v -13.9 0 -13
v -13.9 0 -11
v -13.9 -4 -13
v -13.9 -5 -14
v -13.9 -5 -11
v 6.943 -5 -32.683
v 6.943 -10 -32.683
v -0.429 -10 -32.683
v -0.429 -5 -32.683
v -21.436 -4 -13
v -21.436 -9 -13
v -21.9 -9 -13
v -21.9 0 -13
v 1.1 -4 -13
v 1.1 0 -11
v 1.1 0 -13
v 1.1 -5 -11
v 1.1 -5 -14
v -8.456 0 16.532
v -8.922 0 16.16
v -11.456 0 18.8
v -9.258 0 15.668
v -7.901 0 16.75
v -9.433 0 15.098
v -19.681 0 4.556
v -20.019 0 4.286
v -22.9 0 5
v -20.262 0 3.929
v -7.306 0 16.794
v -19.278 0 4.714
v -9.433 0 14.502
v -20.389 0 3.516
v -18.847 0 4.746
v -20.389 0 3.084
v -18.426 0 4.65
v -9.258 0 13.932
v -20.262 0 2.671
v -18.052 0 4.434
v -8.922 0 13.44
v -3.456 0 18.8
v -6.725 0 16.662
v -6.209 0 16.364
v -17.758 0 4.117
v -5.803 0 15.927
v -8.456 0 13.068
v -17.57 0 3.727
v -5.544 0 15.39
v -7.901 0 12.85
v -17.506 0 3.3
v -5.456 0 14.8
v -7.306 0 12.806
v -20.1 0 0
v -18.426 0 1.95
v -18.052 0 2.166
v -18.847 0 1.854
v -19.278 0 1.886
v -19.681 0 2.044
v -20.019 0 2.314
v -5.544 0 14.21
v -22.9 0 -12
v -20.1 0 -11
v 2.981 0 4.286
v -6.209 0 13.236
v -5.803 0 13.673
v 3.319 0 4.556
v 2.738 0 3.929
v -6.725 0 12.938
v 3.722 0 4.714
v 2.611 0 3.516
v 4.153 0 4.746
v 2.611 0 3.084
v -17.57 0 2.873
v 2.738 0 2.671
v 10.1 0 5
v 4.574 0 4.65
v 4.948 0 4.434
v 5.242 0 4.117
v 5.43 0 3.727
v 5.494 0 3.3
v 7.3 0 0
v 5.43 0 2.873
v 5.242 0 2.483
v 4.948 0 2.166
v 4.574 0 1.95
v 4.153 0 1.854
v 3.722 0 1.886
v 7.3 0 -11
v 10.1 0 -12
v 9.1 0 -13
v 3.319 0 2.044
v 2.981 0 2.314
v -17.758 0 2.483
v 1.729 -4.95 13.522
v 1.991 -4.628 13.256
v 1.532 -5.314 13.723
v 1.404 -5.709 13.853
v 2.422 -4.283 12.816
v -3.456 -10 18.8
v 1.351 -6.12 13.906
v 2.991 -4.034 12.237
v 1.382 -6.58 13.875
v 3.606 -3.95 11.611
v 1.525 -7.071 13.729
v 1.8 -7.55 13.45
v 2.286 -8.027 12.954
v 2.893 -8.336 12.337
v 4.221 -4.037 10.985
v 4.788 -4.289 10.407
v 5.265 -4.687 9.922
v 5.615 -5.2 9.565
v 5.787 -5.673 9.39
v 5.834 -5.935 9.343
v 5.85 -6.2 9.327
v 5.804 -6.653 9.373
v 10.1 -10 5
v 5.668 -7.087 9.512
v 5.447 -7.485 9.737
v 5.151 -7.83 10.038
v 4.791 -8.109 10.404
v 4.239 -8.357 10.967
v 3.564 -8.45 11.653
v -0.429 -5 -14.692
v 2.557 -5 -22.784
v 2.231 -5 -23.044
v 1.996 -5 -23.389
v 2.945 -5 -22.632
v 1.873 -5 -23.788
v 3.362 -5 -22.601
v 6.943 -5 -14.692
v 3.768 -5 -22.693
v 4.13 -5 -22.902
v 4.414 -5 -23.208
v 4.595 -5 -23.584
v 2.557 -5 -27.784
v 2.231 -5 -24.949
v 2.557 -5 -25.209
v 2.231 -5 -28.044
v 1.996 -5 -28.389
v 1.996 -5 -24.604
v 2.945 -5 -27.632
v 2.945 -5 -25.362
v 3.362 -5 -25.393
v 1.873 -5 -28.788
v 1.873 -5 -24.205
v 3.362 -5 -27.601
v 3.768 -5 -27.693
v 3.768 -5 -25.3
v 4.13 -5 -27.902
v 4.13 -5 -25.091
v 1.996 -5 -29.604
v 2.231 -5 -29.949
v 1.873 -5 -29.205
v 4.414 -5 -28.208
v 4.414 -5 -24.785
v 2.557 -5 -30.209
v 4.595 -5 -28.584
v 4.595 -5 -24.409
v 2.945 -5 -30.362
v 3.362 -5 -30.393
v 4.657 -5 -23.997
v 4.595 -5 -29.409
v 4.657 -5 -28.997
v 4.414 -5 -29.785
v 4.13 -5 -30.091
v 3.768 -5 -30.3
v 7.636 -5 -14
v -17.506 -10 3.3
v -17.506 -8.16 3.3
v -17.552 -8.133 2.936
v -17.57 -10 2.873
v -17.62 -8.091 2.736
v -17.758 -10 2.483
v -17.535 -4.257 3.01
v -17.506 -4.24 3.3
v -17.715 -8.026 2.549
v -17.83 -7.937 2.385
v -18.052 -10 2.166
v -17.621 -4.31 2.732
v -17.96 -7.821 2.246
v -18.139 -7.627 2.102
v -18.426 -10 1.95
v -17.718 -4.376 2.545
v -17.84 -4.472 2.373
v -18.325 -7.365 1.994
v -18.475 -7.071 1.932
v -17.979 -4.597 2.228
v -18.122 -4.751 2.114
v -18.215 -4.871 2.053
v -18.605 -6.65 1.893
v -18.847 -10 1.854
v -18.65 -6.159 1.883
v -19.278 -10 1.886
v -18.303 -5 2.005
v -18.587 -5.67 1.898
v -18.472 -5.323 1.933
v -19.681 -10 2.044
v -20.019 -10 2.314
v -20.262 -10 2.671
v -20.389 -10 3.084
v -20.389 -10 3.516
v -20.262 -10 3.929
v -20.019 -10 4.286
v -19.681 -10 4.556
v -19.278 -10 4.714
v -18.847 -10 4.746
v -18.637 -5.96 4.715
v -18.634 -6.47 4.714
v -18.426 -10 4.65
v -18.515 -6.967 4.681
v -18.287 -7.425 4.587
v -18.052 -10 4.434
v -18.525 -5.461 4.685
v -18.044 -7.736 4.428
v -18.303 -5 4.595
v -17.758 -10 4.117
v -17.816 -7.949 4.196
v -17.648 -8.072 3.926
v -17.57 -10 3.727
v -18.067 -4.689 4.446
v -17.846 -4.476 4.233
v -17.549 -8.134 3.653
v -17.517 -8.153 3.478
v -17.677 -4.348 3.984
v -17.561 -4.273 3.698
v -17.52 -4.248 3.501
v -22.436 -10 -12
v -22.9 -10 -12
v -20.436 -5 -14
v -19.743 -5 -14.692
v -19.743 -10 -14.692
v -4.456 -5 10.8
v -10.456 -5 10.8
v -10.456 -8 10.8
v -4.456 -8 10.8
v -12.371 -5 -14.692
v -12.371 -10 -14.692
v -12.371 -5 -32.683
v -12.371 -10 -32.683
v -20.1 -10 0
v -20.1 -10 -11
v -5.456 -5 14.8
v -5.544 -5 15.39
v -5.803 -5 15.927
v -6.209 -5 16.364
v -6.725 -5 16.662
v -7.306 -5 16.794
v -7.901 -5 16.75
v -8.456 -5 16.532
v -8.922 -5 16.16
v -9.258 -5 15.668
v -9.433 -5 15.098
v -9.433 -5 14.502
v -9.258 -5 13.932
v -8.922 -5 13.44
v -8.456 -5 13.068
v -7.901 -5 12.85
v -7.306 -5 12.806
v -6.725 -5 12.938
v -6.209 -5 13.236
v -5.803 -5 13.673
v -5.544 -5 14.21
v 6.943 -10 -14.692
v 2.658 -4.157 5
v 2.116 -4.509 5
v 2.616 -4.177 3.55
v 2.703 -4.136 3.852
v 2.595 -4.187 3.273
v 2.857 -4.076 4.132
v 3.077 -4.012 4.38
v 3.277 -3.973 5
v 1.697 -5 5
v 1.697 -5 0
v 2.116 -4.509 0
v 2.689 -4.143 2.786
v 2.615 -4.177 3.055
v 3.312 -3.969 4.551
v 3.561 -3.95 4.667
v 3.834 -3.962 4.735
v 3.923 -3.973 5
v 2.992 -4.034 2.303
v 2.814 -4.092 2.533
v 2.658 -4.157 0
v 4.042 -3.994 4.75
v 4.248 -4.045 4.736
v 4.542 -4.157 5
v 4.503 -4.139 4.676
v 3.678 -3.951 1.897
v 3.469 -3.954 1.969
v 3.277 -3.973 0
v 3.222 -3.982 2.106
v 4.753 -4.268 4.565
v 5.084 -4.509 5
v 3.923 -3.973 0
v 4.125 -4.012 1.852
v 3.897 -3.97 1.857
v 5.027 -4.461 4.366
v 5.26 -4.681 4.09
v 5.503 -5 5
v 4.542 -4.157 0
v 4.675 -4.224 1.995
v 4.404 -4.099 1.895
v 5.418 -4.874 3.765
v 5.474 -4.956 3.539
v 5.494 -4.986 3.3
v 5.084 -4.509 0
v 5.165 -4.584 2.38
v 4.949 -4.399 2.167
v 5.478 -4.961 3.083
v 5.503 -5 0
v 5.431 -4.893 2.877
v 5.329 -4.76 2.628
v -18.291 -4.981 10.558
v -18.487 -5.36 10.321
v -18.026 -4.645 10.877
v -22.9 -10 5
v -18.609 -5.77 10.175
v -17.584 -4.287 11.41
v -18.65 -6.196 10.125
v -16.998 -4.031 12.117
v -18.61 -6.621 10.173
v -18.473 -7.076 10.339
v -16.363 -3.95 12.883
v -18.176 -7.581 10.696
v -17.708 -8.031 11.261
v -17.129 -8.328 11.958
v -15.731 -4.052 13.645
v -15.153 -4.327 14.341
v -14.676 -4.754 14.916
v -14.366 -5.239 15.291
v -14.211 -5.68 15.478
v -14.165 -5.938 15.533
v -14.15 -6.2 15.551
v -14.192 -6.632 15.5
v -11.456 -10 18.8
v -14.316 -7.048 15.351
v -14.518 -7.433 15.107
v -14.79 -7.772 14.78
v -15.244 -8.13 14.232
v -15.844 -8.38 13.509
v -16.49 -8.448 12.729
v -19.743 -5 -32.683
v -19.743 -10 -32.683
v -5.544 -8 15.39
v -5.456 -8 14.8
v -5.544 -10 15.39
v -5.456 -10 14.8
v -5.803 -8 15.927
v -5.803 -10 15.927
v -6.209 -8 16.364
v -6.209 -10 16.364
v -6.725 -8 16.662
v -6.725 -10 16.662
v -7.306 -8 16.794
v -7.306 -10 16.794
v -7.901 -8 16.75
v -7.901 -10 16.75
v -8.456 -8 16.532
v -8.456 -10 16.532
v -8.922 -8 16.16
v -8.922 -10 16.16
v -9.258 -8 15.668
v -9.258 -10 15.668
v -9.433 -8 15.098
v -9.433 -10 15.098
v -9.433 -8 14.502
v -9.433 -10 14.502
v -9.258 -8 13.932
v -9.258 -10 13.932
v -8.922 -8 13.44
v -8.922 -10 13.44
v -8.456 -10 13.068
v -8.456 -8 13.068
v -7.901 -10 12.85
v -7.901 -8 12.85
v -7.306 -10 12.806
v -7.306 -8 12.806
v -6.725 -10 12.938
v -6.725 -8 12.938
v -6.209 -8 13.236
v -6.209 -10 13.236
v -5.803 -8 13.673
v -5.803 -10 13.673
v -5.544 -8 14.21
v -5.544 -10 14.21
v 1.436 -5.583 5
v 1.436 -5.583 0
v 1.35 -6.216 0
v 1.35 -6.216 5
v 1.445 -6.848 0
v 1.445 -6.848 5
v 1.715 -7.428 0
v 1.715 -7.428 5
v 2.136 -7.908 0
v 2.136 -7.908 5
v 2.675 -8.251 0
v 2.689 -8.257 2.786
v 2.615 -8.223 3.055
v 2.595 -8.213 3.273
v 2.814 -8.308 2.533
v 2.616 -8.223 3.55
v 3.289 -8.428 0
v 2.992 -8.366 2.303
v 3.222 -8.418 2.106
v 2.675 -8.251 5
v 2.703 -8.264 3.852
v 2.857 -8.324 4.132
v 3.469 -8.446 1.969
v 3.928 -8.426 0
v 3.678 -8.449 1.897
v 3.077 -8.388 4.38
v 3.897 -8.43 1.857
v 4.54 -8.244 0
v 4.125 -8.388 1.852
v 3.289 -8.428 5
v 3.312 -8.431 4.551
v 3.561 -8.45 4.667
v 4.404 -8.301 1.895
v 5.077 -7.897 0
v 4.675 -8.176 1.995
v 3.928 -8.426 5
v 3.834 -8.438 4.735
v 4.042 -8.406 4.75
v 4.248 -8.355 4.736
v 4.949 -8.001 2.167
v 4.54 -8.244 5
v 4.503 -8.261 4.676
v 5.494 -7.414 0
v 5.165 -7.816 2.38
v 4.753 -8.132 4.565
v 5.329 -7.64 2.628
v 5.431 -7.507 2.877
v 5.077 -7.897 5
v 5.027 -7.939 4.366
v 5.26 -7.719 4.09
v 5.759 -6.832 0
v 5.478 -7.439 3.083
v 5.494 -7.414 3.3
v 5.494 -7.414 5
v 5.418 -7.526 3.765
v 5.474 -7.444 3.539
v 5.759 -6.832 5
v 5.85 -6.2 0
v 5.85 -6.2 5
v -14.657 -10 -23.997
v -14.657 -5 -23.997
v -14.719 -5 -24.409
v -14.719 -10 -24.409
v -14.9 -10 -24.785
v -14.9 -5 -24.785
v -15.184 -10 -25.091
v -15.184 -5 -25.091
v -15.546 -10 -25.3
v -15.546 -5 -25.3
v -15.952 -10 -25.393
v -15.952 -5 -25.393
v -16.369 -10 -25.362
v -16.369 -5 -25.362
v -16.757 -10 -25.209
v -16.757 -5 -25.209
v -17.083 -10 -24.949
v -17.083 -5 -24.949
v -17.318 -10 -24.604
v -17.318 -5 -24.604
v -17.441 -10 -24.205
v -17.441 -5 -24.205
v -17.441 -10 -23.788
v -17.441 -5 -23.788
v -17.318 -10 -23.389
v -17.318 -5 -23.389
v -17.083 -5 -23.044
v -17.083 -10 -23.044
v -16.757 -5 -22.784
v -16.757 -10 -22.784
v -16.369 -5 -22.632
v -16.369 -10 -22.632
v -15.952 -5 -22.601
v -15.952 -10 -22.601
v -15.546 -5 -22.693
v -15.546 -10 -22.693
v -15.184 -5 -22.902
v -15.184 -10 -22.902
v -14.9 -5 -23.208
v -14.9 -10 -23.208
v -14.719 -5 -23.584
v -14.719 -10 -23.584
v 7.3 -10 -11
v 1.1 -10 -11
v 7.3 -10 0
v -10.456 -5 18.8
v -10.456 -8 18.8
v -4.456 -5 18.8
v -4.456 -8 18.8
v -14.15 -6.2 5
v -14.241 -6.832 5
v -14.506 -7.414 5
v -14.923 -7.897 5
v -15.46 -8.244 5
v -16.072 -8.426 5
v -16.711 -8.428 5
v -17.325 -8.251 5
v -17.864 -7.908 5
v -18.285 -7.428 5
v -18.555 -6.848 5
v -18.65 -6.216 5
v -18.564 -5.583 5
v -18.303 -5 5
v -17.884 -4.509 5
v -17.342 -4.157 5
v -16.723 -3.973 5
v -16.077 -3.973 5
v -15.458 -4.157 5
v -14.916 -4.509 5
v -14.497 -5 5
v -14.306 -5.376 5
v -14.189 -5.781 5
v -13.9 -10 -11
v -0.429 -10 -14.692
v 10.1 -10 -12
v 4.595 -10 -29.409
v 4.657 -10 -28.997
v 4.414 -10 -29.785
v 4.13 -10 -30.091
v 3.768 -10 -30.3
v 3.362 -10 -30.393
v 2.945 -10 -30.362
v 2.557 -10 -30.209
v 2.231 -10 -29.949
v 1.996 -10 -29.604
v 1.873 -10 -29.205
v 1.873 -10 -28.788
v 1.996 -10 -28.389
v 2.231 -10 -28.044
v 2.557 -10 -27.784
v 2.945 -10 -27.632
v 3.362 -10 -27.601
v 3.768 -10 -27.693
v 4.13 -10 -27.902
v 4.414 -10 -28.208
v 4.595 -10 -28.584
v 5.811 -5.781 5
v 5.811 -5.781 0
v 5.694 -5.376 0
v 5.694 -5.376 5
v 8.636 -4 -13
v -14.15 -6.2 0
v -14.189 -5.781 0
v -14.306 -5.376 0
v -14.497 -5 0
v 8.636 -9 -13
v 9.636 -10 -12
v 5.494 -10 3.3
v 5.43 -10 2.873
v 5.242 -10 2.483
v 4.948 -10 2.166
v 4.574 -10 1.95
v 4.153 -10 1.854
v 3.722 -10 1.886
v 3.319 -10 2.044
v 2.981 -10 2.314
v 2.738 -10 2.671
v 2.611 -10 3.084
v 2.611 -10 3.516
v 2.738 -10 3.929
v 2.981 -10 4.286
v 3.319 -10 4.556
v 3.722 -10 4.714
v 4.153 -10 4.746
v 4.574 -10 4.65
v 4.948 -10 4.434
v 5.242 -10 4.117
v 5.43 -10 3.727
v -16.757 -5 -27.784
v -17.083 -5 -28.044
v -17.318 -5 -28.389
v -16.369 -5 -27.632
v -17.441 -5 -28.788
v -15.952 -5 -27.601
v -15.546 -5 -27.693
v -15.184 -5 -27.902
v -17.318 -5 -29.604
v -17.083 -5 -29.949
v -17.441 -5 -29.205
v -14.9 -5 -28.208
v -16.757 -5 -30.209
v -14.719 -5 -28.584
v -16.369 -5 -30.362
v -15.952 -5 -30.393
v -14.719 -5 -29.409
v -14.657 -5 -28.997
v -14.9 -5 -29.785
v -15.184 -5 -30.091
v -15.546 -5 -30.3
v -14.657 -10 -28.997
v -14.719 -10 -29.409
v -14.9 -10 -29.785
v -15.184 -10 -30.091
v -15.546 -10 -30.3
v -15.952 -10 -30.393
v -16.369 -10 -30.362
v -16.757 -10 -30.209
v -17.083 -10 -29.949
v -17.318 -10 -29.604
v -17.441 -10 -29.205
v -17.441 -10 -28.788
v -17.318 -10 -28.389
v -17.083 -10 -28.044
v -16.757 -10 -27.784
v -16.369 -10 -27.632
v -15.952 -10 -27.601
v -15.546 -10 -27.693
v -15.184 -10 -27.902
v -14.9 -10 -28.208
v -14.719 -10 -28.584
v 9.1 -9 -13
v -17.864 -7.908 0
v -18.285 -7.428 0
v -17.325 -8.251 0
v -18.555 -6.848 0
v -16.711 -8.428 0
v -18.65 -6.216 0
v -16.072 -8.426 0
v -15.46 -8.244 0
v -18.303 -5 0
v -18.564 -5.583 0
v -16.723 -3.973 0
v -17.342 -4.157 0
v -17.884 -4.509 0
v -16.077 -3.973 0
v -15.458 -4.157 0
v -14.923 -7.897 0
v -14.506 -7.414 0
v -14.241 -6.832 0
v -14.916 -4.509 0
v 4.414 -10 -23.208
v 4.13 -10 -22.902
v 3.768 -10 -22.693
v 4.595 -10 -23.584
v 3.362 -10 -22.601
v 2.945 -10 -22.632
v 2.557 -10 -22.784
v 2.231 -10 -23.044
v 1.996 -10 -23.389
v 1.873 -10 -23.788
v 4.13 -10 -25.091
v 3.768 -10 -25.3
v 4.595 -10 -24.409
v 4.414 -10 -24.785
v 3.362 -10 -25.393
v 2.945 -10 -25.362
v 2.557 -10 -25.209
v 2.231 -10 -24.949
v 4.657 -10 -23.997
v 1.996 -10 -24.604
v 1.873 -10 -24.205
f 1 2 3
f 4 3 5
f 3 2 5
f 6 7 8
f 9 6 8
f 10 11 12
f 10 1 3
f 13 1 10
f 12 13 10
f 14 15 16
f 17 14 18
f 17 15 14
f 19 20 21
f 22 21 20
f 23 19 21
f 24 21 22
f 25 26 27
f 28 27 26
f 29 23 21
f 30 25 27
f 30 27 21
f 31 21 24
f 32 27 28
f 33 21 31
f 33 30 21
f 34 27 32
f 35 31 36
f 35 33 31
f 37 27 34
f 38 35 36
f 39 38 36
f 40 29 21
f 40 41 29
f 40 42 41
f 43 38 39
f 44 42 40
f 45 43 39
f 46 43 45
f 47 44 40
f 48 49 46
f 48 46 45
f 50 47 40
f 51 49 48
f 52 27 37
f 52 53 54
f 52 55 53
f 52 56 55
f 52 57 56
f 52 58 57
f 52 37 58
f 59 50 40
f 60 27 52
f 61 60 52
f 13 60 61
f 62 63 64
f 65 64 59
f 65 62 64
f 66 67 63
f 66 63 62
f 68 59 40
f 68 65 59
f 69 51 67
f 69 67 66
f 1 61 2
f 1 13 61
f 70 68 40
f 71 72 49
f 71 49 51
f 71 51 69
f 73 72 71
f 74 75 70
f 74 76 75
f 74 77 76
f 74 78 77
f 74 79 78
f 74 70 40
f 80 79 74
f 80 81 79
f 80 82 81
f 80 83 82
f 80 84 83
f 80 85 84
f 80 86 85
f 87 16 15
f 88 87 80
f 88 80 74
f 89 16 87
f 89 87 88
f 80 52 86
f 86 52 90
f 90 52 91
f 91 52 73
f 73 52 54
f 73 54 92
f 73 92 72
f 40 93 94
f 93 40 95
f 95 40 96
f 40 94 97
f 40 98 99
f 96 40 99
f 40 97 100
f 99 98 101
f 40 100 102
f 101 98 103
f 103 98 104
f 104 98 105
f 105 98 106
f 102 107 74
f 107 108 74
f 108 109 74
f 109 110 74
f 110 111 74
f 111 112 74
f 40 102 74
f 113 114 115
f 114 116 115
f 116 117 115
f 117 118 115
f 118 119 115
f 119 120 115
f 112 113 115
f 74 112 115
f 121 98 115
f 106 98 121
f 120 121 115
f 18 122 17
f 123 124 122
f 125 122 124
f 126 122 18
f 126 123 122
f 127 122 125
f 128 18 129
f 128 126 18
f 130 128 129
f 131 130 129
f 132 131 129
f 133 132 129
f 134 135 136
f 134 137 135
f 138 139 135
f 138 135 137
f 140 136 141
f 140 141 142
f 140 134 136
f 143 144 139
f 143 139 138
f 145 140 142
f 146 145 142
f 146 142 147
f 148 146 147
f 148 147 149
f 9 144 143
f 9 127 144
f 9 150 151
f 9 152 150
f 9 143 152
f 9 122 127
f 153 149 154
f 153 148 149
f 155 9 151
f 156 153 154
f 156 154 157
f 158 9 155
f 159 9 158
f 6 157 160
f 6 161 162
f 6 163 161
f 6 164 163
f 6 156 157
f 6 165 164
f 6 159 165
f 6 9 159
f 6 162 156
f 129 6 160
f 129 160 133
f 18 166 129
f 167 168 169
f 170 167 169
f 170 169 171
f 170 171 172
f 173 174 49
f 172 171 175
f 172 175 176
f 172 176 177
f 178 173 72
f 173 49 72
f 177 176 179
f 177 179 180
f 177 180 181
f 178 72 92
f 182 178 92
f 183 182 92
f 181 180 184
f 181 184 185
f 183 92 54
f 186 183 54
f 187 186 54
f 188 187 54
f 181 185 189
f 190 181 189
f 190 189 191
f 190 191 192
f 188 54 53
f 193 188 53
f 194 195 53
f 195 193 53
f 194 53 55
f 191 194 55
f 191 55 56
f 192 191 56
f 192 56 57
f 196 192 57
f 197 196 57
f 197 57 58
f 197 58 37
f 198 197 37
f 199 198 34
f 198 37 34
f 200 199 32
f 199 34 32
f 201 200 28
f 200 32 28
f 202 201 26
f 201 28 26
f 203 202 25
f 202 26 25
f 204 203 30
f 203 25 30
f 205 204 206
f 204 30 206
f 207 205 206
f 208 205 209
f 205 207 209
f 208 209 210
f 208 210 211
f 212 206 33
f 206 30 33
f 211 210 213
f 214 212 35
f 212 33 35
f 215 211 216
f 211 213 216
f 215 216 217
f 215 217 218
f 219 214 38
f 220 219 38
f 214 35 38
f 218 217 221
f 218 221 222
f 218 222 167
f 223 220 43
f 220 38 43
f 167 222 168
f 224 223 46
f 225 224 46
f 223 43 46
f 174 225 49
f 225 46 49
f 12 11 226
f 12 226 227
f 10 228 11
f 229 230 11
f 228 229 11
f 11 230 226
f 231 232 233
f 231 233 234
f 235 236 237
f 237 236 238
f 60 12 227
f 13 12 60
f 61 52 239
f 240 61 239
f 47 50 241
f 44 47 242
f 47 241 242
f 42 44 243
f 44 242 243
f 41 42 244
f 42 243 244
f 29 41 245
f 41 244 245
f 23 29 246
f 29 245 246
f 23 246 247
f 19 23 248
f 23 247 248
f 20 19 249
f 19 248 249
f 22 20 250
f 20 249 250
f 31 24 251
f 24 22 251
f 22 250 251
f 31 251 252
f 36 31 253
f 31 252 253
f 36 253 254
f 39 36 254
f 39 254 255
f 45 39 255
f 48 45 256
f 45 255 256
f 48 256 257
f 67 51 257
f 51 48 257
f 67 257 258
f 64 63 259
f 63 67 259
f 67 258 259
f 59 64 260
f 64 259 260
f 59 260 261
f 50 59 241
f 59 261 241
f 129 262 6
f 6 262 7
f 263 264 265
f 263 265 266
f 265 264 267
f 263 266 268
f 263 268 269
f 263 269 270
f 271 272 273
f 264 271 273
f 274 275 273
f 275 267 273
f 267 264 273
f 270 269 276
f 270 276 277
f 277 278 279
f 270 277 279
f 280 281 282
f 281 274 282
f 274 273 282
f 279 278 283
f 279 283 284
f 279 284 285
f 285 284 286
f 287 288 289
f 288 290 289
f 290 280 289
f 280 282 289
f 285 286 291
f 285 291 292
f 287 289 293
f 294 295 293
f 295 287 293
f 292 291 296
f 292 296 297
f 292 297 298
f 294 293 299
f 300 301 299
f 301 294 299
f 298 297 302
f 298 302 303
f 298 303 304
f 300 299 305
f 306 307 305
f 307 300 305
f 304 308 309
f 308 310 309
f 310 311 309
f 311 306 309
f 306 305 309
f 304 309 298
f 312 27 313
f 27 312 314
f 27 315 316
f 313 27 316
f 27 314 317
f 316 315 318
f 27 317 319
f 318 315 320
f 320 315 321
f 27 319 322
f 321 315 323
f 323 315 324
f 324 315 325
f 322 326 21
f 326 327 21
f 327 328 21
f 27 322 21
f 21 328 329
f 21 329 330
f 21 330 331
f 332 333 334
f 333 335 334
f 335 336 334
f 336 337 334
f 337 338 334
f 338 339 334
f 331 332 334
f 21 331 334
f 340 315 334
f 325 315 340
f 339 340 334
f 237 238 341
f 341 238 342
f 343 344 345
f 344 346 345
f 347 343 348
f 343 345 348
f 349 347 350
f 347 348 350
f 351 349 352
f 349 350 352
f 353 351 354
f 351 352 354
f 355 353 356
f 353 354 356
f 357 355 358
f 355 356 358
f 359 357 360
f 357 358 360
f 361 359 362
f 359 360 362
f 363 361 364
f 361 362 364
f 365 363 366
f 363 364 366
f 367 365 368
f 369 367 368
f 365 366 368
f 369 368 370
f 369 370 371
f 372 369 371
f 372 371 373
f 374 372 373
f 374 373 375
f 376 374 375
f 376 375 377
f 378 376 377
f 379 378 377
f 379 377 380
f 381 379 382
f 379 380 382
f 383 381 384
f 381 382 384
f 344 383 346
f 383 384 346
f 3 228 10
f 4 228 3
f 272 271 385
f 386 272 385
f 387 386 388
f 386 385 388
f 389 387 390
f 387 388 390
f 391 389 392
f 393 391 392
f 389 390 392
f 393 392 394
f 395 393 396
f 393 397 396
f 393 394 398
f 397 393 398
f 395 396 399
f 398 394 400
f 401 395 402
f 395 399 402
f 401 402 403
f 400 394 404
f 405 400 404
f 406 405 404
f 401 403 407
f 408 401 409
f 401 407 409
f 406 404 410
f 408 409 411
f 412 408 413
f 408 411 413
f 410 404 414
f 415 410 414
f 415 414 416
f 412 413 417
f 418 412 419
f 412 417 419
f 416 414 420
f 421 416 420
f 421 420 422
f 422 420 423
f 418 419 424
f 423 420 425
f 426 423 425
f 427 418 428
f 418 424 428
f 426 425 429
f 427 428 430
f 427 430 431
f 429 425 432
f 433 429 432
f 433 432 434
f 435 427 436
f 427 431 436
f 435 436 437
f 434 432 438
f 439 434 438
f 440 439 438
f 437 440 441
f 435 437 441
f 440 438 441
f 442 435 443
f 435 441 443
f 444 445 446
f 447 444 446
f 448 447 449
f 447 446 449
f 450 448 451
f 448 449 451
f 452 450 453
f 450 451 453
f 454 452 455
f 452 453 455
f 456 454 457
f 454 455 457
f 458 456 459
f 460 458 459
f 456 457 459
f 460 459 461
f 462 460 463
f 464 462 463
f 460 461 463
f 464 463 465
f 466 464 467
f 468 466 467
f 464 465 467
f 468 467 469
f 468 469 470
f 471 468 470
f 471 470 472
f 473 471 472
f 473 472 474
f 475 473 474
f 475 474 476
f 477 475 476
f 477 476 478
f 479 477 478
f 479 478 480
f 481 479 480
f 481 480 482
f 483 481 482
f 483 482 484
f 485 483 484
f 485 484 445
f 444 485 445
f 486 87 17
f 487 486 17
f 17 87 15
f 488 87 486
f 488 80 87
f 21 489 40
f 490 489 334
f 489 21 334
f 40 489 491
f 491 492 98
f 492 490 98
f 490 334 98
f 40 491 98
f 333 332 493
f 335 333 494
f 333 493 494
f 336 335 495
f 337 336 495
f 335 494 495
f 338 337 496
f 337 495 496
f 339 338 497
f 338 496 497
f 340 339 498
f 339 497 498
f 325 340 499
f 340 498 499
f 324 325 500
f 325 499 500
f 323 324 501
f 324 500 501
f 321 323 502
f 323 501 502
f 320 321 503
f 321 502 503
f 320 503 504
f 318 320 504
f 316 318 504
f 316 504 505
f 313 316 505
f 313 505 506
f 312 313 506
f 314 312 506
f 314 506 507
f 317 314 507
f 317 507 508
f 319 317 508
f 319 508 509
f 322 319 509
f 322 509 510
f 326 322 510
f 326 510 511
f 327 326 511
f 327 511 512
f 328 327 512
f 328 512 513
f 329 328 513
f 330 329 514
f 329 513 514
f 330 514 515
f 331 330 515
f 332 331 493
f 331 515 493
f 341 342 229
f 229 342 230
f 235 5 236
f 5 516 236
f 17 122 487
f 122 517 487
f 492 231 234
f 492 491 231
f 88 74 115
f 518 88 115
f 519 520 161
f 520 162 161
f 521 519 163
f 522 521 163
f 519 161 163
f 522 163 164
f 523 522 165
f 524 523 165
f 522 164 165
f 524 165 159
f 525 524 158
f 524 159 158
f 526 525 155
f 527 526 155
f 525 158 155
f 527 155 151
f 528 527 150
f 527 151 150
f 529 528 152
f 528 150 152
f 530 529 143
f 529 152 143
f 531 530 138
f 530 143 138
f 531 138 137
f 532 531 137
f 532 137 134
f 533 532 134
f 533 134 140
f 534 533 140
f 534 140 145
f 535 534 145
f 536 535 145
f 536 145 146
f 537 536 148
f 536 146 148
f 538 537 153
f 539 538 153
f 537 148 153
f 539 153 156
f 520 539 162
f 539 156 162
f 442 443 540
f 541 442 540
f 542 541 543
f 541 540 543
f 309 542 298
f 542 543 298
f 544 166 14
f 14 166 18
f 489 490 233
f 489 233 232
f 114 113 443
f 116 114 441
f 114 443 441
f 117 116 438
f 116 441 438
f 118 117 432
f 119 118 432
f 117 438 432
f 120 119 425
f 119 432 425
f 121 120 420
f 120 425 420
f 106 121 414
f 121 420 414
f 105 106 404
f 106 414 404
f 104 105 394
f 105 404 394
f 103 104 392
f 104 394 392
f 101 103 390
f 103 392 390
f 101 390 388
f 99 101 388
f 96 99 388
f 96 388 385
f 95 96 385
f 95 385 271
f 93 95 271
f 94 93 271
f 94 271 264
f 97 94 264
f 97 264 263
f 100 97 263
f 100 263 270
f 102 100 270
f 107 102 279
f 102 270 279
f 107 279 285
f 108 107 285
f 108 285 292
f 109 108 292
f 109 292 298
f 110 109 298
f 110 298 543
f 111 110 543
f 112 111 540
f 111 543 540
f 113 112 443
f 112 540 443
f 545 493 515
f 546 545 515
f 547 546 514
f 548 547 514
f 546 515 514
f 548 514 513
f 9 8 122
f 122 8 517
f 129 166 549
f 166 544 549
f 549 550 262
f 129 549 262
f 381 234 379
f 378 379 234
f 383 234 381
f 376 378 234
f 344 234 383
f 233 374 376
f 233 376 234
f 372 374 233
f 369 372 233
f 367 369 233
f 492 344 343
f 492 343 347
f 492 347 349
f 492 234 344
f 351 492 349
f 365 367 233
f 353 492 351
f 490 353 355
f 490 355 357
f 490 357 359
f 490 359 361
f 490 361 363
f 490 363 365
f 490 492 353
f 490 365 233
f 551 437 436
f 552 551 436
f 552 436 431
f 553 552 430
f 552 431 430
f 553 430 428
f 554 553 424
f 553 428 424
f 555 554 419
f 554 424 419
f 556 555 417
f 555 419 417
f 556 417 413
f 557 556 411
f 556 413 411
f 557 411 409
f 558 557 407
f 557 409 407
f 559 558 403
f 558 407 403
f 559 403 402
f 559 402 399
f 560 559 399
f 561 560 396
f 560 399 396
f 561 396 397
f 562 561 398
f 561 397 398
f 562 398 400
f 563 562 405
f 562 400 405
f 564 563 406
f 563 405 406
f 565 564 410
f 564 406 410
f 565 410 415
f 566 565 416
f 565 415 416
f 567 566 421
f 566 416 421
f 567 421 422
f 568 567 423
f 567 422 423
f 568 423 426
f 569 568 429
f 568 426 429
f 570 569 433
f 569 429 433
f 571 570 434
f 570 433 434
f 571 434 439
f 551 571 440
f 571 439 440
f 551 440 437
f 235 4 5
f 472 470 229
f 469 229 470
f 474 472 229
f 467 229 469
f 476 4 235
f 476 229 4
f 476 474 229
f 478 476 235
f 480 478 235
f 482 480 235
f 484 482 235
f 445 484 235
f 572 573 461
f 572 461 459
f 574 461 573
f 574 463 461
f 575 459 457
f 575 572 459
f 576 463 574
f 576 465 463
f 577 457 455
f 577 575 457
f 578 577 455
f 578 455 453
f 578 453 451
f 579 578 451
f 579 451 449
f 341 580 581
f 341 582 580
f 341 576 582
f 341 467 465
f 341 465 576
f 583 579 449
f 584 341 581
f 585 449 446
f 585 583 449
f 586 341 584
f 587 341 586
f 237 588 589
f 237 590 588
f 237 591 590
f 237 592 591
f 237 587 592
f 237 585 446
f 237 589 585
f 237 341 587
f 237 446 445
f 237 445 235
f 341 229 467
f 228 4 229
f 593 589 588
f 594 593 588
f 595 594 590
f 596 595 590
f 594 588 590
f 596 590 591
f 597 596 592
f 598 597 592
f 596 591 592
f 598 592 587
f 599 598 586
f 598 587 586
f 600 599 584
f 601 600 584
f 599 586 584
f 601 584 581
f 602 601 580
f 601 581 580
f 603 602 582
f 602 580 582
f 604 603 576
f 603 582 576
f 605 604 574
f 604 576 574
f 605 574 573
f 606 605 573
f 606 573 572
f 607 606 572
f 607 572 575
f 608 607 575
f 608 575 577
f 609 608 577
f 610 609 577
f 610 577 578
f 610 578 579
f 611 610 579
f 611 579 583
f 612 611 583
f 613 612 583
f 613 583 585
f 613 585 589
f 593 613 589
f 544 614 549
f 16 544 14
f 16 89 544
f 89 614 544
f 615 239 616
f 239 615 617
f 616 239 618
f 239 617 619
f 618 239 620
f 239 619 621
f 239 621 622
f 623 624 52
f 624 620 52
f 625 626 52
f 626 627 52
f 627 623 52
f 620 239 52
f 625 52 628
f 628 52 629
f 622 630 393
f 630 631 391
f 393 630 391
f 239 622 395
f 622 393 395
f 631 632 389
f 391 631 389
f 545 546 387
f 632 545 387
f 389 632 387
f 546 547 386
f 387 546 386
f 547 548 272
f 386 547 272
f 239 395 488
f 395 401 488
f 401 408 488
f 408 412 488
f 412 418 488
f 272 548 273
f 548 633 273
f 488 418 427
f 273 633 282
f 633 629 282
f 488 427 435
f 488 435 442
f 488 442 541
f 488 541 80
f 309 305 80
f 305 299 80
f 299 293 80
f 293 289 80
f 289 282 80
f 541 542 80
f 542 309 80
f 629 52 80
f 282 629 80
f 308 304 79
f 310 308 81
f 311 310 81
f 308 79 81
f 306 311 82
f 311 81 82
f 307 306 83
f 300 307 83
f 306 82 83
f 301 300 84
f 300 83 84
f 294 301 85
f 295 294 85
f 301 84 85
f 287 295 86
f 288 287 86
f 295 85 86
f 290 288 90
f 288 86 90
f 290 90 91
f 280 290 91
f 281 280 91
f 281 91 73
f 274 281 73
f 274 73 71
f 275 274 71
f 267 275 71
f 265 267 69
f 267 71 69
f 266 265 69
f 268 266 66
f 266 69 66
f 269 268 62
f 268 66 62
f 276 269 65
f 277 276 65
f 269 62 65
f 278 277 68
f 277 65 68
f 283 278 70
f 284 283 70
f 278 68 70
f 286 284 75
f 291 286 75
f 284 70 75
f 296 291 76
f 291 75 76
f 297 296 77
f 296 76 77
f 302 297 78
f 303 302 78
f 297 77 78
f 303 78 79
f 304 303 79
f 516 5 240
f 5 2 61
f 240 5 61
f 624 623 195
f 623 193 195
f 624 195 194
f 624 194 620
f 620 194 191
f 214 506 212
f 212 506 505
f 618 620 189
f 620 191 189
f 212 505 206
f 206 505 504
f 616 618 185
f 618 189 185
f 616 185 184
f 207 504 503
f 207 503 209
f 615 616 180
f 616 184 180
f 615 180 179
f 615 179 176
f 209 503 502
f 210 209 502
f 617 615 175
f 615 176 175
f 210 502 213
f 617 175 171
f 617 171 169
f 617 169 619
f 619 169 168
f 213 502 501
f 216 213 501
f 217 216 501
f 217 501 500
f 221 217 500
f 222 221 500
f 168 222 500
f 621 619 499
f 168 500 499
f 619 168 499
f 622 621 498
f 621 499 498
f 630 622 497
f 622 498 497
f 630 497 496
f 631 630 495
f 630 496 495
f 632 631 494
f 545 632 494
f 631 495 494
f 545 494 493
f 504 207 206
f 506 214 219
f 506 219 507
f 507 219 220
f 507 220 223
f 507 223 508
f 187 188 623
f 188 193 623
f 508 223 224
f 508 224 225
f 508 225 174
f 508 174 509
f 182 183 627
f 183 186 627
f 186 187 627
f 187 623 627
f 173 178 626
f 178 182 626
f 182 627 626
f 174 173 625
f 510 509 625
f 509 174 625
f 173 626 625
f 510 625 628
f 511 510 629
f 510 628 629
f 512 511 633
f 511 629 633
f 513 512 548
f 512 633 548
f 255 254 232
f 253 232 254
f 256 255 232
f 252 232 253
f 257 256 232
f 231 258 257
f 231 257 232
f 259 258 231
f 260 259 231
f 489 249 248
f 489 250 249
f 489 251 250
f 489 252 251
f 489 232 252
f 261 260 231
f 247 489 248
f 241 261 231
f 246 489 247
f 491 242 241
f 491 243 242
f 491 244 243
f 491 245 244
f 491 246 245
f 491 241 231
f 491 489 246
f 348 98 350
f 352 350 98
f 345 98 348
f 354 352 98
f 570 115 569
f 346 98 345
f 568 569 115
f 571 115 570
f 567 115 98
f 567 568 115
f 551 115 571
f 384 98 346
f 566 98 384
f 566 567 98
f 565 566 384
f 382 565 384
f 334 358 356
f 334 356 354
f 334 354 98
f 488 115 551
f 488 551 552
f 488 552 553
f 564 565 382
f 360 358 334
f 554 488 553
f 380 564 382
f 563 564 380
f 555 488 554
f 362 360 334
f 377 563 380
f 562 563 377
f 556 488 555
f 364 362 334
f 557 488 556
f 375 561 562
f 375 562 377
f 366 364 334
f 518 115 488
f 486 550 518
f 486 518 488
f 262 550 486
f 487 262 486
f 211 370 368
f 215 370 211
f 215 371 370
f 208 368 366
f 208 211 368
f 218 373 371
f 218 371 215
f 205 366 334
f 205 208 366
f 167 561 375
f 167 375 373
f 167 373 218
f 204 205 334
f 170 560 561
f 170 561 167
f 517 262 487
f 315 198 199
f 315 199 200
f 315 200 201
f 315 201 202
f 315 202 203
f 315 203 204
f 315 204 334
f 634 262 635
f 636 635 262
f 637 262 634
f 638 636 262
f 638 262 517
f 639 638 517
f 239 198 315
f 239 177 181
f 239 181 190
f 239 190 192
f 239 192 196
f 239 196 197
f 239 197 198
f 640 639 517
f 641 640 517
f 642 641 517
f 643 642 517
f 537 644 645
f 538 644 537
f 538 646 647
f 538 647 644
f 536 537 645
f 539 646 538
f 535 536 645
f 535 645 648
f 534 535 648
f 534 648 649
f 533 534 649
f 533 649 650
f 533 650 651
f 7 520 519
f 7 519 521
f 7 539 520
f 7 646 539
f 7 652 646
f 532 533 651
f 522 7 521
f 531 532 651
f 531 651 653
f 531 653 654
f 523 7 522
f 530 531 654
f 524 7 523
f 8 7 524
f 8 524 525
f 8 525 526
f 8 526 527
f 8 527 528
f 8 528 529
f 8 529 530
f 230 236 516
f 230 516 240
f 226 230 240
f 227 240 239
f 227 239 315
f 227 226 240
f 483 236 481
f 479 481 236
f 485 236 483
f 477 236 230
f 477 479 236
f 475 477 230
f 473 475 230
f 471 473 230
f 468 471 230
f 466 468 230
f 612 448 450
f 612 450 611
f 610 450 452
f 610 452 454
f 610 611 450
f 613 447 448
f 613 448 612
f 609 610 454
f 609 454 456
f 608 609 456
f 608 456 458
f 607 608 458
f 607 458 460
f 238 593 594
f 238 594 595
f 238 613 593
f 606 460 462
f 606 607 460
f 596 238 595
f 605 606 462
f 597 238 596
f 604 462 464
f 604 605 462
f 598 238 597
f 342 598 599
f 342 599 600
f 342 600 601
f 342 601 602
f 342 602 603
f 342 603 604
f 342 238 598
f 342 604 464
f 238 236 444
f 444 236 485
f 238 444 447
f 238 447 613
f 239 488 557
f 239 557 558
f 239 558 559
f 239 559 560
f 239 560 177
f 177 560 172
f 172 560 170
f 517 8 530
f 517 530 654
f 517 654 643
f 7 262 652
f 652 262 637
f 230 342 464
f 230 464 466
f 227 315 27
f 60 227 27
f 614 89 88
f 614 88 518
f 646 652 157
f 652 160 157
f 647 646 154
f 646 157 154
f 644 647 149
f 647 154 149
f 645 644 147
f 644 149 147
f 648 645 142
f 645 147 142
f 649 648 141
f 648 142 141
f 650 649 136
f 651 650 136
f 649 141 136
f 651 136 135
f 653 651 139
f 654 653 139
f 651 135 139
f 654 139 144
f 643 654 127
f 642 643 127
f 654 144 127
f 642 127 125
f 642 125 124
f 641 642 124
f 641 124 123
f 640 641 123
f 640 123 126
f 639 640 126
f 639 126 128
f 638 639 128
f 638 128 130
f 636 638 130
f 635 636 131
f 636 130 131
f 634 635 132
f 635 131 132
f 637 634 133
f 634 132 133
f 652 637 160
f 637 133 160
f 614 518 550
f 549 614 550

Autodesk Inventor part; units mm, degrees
ref_plane "YZ Plane" through (0, 0, 0) normal (1, 0, 0) x (0, 1, 0)
ref_plane "Work Plane1" through (26.5, 0, 0) normal (0, 0, -1) x (-1, 0, 0)
sketch "Sketch1" plane through (-19.3, 0, 0) normal (0, 0, 1) x (1, 0, 0)
  circle A0 centre (2.9, -26.2) radius 1.75 projected
  circle A1 centre (2.9, -6.2) radius 1.75 projected
  circle A2 centre (22.9, -26.2) radius 1.75 projected
  circle A3 centre (22.9, -6.2) radius 1.75 projected
  line L0 (0.3744, -33.9) -> (0.3744, 2.1) construction
  line L1 (25.8, 0) -> (25.8, -32.4) construction
  line L2 (-0.6, 0) -> (-0.6, -32.4) construction
  line L3 (19.3, -32.4) -> (25.8, -32.4) construction
  line L4 (25.8, 0) -> (25.8, -32.4) construction
  line L5 (19.3, 0) -> (25.8, 0) construction
  line L6 (19.3, 0) -> (19.3, -32.4) construction
  circle A4 centre (22.9, -6.2) radius 1.75 construction
  circle A5 centre (22.9, -26.2) radius 1.75 construction
  line L7 (0, -32.4) -> (6.5, -32.4) construction
  line L8 (6.5, 0) -> (6.5, -32.4) construction
  line L9 (0, 0) -> (6.5, 0) construction
  line L10 (0, 0) -> (0, -32.4) construction
  circle A6 centre (2.9, -6.2) radius 1.75 construction
  circle A7 centre (2.9, -26.2) radius 1.75 construction
  line L11 (29.4, -10) -> (-3.6, -10)
  line L12 (-3.6, -10) -> (-3.6, 0)
  line L13 (-3.6, 0) -> (29.4, 0)
  line L14 (29.4, 0) -> (29.4, -10)
  circle A8 centre (22.9, -26.2) radius 2.25
  circle A9 centre (22.9, -6.2) radius 2.25
  circle A10 centre (2.9, -6.2) radius 2.25
  circle A11 centre (2.9, -26.2) radius 2.25
  line L15 (26.4, 0) -> (26.4, -32.4) projected
  dimension "d1" = 3
  dimension "d2" = 0.5
  dimension "d3" = 0.5
  dimension "d4" = 0.5
  dimension "d5" = 0.5
  dimension "d19" = 3
  dimension "d32" = 10
extrude "Extrusion1" add sketch "Sketch1" along normal blind 5 contours L11 L15 L13 L14 | L11 L12 L13 L15
sketch "Sketch2" plane through (-19.3, 0, 0) normal (0, 0, -1) x (-1, 0, 0)
  circle A0 centre (-2.9, -6.2) radius 2.25 projected
  circle A1 centre (-22.9, -6.2) radius 2.25 projected
  line L0 (3.6, -10) -> (-29.4, -10) projected
  line L1 (-29.4, -10) -> (-29.4, 0) projected
  line L2 (-29.4, 0) -> (3.6, 0) projected
  line L3 (3.6, 0) -> (3.6, -10) projected
  line L4 (3.6, -10) -> (3.6, 0) projected
  line L5 (3.6, 0) -> (0.8, 0)
  line L6 (0.8, 0) -> (0.8, -10)
  line L7 (0.8, -10) -> (3.6, -10)
  line L8 (3.6, -10) -> (3.6, 0)
  line L9 (-29.4, -10) -> (3.6, -10) projected
  line L10 (-29.4, 0) -> (-26.6, 0)
  line L11 (-26.6, 0) -> (-26.6, -10)
  line L12 (-26.6, -10) -> (-29.4, -10)
  line L13 (-29.4, -10) -> (-29.4, 0)
  point P0 (-19.3, 0)
  dimension "d8" = 2.8
  dimension "d9" = 2.8
  dimension "d10" = 0
extrude "Extrusion2" add sketch "Sketch2" along normal blind 12 contours L0 L6 L2 L3 | L0 L1 L2 L11
sketch "Sketch3" plane through (-19.3, 0, -12) normal (0, 0, -1) x (-1, 0, 0)
  line L0 (-29.4, 0) -> (-29.4, -10) projected
  line L1 (-29.4, -10) -> (-26.6, -10) projected
  line L2 (-26.6, -10) -> (-26.6, 0) projected
  line L3 (-26.6, 0) -> (-29.4, 0) projected
  line L4 (3.6, -10) -> (3.6, 0) projected
  line L5 (3.6, 0) -> (0.8, 0) projected
  line L6 (0.8, 0) -> (0.8, -10) projected
  line L7 (-18.8691, 0.2794) -> (-18.8691, -79.7206) construction
  line L8 (-8.1725, 0.2794) -> (-8.1725, -79.7206) construction
  line L9 (-29.4, 0) -> (3.6, 0) construction
  line L10 (3.6, -10) -> (-29.4, -10) projected
  line L11 (-29.4, 0) -> (-20.4, 0)
  line L12 (-20.4, 0) -> (-20.4, -10)
  line L13 (-20.4, -10) -> (-29.4, -10)
  line L14 (-29.4, -10) -> (-29.4, 0)
  line L15 (3.6, 0) -> (3.6, -10) projected
  line L16 (3.6, 0) -> (-5.4, 0)
  line L17 (-5.4, 0) -> (-5.4, -10)
  line L18 (-5.4, -10) -> (3.6, -10)
  line L19 (3.6, -10) -> (3.6, 0)
  line L20 (0.8, -10) -> (3.6, -10) projected
  point P0 (-19.3, 0)
  dimension "d13" = 9
  dimension "d14" = 9
extrude "Extrusion3" add sketch "Sketch3" along normal blind 1 and the other way blind 1
ref_plane "Work Plane2" through (-22.9, -4, 5) normal (0, 1, 0) x (1, 0, 0)
sketch "Sketch4" plane through (-22.9, -10, 5) normal (0, 1, 0) x (1, 0, 0)
  line L0 (0, 0) -> (0, 18) projected
  line L1 (33, 0) -> (0, 0) projected
  line L2 (33, 0) -> (33, 18) projected
  line L3 (24, 18) -> (33, 18) projected
  line L4 (24, 18) -> (24, 16) projected
  line L5 (30.2, 16) -> (24, 16) projected
  line L6 (30.2, 5) -> (30.2, 16) projected
  line L7 (2.8, 5) -> (30.2, 5) projected
  line L8 (2.8, 5) -> (2.8, 16) projected
  line L9 (9, 16) -> (2.8, 16) projected
  line L10 (9, 16) -> (9, 18) projected
  line L11 (0, 18) -> (9, 18) projected
  line L12 (32.9002, 18.2) -> (30.3433, 20.7569) construction
  line L13 (-0.4956, 21.98) -> (-4.2756, 18.2) construction
  line L14 (34.2709, 21.1536) -> (36.398, 19.0265) construction
  line L15 (30.3433, 26.08) -> (30.3433, 18.1) construction
  line L16 (21.9706, 26.08) -> (21.9706, 18.1) construction
  line L17 (11.0029, 26.08) -> (11.0029, 18.1) construction
  line L18 (2.6055, 26.08) -> (2.6055, 20.7569) construction
  line L19 (24, 18) -> (33, 18) projected
  line L20 (31.5357, 18) -> (29.8433, 19.6923)
  line L21 (29.8433, 19.6923) -> (22.4706, 19.6923)
  line L22 (22.4706, 19.6923) -> (24, 16)
  line L23 (29.8433, 19.6923) -> (29.8433, 37.6831)
  line L24 (22.4706, 19.6923) -> (29.8433, 19.6923)
  line L25 (29.8433, 19.6923) -> (29.8433, 37.6831)
  line L26 (29.8433, 37.6831) -> (22.4706, 37.6831)
  line L27 (22.4706, 37.6831) -> (22.4706, 19.6923)
  point P0 (22.9, 5)
  dimension "d21" = 157.5
  dimension "d22" = 0.5
  dimension "d23" = 0.5
extrude "Extrusion4" add sketch "Sketch4" along normal blind 5
ref_plane "Work Plane3" through (-6.4, -10, 5) normal (-1, 0, 0) x (0, 0, 1)
mirror "Mirror1" about plane through (-6.4, -10, 5) normal (-1, 0, 0) of "Extrusion4"
chamfer "Chamfer2" distance 1 angle 45 4 edges at (9.3678, -10, -13) (-22.1678, -10, -13) (-17.6678, -5, -13) (4.8678, -5, -13)
sketch "Sketch5" plane through (-22.9, -5, 5) normal (0, 1, 0) x (1, 0, 0)
  line L0 (24, 19) -> (24, 16) projected
  line L1 (30.5357, 19) -> (24, 19) projected
  line L2 (30.5357, 19) -> (29.8433, 19.6923) projected
  line L3 (29.8433, 19.6923) -> (29.8433, 37.6831) projected
  line L4 (29.8433, 37.6831) -> (22.4706, 37.6831) projected
  line L5 (22.4706, 37.6831) -> (22.4706, 19.6923) projected
  line L6 (22.4706, 19.6923) -> (24, 16) projected
  line L7 (9, 19) -> (2.4643, 19) projected
  line L8 (9, 16) -> (9, 19) projected
  line L9 (10.5294, 19.6923) -> (9, 16) projected
  line L10 (10.5294, 37.6831) -> (10.5294, 19.6923) projected
  line L11 (3.1567, 37.6831) -> (10.5294, 37.6831) projected
  line L12 (3.1567, 19.6923) -> (3.1567, 37.6831) projected
  line L13 (2.4643, 19) -> (3.1567, 19.6923) projected
  circle A0 centre (26.1569, 33.9967) radius 3.6864
  circle A1 centre (6.843, 33.9967) radius 3.6864
  circle A2 centre (26.1569, 33.9967) radius 1.4
  circle A3 centre (6.843, 33.9967) radius 1.4
  circle A4 centre (26.1569, 28.9967) radius 1.4
  circle A5 centre (6.843, 28.9967) radius 1.4
  point P0 (22.9, 5)
  dimension "d33" = 2.8
  dimension "d34" = 2.8
  dimension "d37" = 2.8
  dimension "d38" = 2.8
  dimension "d39" = 5
  dimension "d40" = 5
extrude "Extrusion5" cut sketch "Sketch5" against normal through all contours A4 A0 | A0 A4 | A5 A1 | A1 A5 | A2 | A3 picked at (26.2031, 30.3641) picked at (26.0901, 28.5093) picked at (6.8892, 30.3641) picked at (6.7762, 28.5093)
sketch "Sketch6" plane through (-22.9, -10, 5) normal (0, 1, 0) x (1, 0, 0)
  line L0 (0, 0) -> (0, 18) projected
  line L1 (33, 0) -> (0, 0) projected
  line L2 (33, 0) -> (33, 18) projected
  line L3 (24, 18) -> (33, 18) projected
  line L4 (24, 18) -> (24, 16) projected
  line L5 (30.2, 16) -> (24, 16) projected
  line L6 (30.2, 5) -> (30.2, 16) projected
  line L7 (2.8, 5) -> (30.2, 5) projected
  line L8 (2.8, 5) -> (2.8, 16) projected
  line L9 (9, 16) -> (2.8, 16) projected
  line L10 (9, 16) -> (9, 18) projected
  line L11 (0, 18) -> (9, 18) projected
  circle A0 centre (15.4444, -9.8) radius 1.1933 projected
  line L12 (0, 0) -> (11.4444, -13.8)
  line L13 (11.4444, -13.8) -> (19.4444, -13.8)
  line L14 (33, 0) -> (33, 18) projected
  line L15 (19.4444, -13.8) -> (33, 0)
  circle A1 centre (15.4444, -9.8) radius 2
  point P0 (22.9, 5)
  dimension "d41" = 4
  dimension "d42" = 4
  dimension "d43" = 4
  dimension "d44" = 4
ref_plane "Work Plane4" through (-24.55, -10, -34.5672) normal (0, -1, 0) x (1, 0, 0)
extrude "Extrusion6" add sketch "Sketch6" along normal up to surface (10 mm away) contours L1 L15 L13 L12
ref_plane "Work Plane5" through (-19.3, -32.4, 0) normal (0, 0, 1) x (1, 0, 0)
sketch "Sketch7" plane through (-19.3, 0, 5) normal (0, 0, 1) x (1, 0, 0)
  circle A0 centre (2.9, -6.2) radius 1.5 projected
  circle A1 centre (22.9, -6.2) radius 1.25 projected
  circle A2 centre (2.9, -6.2) radius 2.25
  circle A3 centre (22.9, -6.2) radius 2.25
  point P0 (19.3, 0)
  dimension "d47" = 4.5
  dimension "d48" = 4.5
extrude "Extrusion7" cut sketch "Sketch7" against normal up to surface (5 mm away) contours A0 | A1 | A2 | A3
sketch "Sketch8" plane through (-11.4556, -10, 18.8) normal (0, 0, 1) x (1, 0, 0)
  line L0 (0, 0) -> (8, 0) projected
  line L1 (8, 0) -> (8, 10) projected
  line L2 (0, 0) -> (0, 10) projected
  line L3 (2.5, 13.1294) -> (2.5, 10.1294)
  line L4 (5.5, 13.1294) -> (5.5, 10.1294)
  line L5 (1, 5) -> (7, 5)
  line L6 (7, 5) -> (7, 2)
  line L7 (7, 2) -> (1, 2)
  line L8 (1, 2) -> (1, 5)
  line L9 (1, 5) -> (7, 2) construction
  line L10 (7, 5) -> (1, 2) construction
  line L11 (8, 10) -> (0, 10) projected
  point P0 (11.4556, 10)
  point P1 (4, 3.5)
  dimension "d51" = 6
  dimension "d52" = 3
extrude "Extrusion8" cut sketch "Sketch8" against normal blind 8 contours L5 L6 L7 L8
sketch "Sketch9" plane through (-19.3, 0, 5) normal (0, 0, 1) x (1, 0, 0)
  circle A0 centre (2.9, -6.2) radius 1.75 projected
  circle A1 centre (22.9, -6.2) radius 1.75 projected
  circle A2 centre (2.9, -6.2) radius 2.25 projected
  circle A3 centre (22.9, -6.2) radius 2.25 projected
  point P0 (19.3, 0)
extrude "Extrusion9" cut sketch "Sketch9" along normal through all contours A0 | A1 | A2 | A3
chamfer "Chamfer3" distance 1 angle 45 2 edges at (10.1, -4.5, -13) (-22.9, -4.5, -13)
sketch "Sketch10" plane through (-20.1, 0, 0) normal (0, 1, 0) x (1, 0, 0)
  circle A0 centre (1.1444, -3.3) radius 1.25 projected
  circle A1 centre (24.1444, -3.3) radius 1.25 projected
  circle A2 centre (1.1444, -3.3) radius 1.45
  circle A3 centre (24.1444, -3.3) radius 1.45
  point P0 (20.1, 0)
  dimension "d60" = 2.9
  dimension "d61" = 2.9
extrude "Extrusion10" cut sketch "Sketch10" against normal through all contours A0 | A1 | A2 | A3
properties part number "30_Cube_Z_Focus_Drylin_NEMA_slide"
